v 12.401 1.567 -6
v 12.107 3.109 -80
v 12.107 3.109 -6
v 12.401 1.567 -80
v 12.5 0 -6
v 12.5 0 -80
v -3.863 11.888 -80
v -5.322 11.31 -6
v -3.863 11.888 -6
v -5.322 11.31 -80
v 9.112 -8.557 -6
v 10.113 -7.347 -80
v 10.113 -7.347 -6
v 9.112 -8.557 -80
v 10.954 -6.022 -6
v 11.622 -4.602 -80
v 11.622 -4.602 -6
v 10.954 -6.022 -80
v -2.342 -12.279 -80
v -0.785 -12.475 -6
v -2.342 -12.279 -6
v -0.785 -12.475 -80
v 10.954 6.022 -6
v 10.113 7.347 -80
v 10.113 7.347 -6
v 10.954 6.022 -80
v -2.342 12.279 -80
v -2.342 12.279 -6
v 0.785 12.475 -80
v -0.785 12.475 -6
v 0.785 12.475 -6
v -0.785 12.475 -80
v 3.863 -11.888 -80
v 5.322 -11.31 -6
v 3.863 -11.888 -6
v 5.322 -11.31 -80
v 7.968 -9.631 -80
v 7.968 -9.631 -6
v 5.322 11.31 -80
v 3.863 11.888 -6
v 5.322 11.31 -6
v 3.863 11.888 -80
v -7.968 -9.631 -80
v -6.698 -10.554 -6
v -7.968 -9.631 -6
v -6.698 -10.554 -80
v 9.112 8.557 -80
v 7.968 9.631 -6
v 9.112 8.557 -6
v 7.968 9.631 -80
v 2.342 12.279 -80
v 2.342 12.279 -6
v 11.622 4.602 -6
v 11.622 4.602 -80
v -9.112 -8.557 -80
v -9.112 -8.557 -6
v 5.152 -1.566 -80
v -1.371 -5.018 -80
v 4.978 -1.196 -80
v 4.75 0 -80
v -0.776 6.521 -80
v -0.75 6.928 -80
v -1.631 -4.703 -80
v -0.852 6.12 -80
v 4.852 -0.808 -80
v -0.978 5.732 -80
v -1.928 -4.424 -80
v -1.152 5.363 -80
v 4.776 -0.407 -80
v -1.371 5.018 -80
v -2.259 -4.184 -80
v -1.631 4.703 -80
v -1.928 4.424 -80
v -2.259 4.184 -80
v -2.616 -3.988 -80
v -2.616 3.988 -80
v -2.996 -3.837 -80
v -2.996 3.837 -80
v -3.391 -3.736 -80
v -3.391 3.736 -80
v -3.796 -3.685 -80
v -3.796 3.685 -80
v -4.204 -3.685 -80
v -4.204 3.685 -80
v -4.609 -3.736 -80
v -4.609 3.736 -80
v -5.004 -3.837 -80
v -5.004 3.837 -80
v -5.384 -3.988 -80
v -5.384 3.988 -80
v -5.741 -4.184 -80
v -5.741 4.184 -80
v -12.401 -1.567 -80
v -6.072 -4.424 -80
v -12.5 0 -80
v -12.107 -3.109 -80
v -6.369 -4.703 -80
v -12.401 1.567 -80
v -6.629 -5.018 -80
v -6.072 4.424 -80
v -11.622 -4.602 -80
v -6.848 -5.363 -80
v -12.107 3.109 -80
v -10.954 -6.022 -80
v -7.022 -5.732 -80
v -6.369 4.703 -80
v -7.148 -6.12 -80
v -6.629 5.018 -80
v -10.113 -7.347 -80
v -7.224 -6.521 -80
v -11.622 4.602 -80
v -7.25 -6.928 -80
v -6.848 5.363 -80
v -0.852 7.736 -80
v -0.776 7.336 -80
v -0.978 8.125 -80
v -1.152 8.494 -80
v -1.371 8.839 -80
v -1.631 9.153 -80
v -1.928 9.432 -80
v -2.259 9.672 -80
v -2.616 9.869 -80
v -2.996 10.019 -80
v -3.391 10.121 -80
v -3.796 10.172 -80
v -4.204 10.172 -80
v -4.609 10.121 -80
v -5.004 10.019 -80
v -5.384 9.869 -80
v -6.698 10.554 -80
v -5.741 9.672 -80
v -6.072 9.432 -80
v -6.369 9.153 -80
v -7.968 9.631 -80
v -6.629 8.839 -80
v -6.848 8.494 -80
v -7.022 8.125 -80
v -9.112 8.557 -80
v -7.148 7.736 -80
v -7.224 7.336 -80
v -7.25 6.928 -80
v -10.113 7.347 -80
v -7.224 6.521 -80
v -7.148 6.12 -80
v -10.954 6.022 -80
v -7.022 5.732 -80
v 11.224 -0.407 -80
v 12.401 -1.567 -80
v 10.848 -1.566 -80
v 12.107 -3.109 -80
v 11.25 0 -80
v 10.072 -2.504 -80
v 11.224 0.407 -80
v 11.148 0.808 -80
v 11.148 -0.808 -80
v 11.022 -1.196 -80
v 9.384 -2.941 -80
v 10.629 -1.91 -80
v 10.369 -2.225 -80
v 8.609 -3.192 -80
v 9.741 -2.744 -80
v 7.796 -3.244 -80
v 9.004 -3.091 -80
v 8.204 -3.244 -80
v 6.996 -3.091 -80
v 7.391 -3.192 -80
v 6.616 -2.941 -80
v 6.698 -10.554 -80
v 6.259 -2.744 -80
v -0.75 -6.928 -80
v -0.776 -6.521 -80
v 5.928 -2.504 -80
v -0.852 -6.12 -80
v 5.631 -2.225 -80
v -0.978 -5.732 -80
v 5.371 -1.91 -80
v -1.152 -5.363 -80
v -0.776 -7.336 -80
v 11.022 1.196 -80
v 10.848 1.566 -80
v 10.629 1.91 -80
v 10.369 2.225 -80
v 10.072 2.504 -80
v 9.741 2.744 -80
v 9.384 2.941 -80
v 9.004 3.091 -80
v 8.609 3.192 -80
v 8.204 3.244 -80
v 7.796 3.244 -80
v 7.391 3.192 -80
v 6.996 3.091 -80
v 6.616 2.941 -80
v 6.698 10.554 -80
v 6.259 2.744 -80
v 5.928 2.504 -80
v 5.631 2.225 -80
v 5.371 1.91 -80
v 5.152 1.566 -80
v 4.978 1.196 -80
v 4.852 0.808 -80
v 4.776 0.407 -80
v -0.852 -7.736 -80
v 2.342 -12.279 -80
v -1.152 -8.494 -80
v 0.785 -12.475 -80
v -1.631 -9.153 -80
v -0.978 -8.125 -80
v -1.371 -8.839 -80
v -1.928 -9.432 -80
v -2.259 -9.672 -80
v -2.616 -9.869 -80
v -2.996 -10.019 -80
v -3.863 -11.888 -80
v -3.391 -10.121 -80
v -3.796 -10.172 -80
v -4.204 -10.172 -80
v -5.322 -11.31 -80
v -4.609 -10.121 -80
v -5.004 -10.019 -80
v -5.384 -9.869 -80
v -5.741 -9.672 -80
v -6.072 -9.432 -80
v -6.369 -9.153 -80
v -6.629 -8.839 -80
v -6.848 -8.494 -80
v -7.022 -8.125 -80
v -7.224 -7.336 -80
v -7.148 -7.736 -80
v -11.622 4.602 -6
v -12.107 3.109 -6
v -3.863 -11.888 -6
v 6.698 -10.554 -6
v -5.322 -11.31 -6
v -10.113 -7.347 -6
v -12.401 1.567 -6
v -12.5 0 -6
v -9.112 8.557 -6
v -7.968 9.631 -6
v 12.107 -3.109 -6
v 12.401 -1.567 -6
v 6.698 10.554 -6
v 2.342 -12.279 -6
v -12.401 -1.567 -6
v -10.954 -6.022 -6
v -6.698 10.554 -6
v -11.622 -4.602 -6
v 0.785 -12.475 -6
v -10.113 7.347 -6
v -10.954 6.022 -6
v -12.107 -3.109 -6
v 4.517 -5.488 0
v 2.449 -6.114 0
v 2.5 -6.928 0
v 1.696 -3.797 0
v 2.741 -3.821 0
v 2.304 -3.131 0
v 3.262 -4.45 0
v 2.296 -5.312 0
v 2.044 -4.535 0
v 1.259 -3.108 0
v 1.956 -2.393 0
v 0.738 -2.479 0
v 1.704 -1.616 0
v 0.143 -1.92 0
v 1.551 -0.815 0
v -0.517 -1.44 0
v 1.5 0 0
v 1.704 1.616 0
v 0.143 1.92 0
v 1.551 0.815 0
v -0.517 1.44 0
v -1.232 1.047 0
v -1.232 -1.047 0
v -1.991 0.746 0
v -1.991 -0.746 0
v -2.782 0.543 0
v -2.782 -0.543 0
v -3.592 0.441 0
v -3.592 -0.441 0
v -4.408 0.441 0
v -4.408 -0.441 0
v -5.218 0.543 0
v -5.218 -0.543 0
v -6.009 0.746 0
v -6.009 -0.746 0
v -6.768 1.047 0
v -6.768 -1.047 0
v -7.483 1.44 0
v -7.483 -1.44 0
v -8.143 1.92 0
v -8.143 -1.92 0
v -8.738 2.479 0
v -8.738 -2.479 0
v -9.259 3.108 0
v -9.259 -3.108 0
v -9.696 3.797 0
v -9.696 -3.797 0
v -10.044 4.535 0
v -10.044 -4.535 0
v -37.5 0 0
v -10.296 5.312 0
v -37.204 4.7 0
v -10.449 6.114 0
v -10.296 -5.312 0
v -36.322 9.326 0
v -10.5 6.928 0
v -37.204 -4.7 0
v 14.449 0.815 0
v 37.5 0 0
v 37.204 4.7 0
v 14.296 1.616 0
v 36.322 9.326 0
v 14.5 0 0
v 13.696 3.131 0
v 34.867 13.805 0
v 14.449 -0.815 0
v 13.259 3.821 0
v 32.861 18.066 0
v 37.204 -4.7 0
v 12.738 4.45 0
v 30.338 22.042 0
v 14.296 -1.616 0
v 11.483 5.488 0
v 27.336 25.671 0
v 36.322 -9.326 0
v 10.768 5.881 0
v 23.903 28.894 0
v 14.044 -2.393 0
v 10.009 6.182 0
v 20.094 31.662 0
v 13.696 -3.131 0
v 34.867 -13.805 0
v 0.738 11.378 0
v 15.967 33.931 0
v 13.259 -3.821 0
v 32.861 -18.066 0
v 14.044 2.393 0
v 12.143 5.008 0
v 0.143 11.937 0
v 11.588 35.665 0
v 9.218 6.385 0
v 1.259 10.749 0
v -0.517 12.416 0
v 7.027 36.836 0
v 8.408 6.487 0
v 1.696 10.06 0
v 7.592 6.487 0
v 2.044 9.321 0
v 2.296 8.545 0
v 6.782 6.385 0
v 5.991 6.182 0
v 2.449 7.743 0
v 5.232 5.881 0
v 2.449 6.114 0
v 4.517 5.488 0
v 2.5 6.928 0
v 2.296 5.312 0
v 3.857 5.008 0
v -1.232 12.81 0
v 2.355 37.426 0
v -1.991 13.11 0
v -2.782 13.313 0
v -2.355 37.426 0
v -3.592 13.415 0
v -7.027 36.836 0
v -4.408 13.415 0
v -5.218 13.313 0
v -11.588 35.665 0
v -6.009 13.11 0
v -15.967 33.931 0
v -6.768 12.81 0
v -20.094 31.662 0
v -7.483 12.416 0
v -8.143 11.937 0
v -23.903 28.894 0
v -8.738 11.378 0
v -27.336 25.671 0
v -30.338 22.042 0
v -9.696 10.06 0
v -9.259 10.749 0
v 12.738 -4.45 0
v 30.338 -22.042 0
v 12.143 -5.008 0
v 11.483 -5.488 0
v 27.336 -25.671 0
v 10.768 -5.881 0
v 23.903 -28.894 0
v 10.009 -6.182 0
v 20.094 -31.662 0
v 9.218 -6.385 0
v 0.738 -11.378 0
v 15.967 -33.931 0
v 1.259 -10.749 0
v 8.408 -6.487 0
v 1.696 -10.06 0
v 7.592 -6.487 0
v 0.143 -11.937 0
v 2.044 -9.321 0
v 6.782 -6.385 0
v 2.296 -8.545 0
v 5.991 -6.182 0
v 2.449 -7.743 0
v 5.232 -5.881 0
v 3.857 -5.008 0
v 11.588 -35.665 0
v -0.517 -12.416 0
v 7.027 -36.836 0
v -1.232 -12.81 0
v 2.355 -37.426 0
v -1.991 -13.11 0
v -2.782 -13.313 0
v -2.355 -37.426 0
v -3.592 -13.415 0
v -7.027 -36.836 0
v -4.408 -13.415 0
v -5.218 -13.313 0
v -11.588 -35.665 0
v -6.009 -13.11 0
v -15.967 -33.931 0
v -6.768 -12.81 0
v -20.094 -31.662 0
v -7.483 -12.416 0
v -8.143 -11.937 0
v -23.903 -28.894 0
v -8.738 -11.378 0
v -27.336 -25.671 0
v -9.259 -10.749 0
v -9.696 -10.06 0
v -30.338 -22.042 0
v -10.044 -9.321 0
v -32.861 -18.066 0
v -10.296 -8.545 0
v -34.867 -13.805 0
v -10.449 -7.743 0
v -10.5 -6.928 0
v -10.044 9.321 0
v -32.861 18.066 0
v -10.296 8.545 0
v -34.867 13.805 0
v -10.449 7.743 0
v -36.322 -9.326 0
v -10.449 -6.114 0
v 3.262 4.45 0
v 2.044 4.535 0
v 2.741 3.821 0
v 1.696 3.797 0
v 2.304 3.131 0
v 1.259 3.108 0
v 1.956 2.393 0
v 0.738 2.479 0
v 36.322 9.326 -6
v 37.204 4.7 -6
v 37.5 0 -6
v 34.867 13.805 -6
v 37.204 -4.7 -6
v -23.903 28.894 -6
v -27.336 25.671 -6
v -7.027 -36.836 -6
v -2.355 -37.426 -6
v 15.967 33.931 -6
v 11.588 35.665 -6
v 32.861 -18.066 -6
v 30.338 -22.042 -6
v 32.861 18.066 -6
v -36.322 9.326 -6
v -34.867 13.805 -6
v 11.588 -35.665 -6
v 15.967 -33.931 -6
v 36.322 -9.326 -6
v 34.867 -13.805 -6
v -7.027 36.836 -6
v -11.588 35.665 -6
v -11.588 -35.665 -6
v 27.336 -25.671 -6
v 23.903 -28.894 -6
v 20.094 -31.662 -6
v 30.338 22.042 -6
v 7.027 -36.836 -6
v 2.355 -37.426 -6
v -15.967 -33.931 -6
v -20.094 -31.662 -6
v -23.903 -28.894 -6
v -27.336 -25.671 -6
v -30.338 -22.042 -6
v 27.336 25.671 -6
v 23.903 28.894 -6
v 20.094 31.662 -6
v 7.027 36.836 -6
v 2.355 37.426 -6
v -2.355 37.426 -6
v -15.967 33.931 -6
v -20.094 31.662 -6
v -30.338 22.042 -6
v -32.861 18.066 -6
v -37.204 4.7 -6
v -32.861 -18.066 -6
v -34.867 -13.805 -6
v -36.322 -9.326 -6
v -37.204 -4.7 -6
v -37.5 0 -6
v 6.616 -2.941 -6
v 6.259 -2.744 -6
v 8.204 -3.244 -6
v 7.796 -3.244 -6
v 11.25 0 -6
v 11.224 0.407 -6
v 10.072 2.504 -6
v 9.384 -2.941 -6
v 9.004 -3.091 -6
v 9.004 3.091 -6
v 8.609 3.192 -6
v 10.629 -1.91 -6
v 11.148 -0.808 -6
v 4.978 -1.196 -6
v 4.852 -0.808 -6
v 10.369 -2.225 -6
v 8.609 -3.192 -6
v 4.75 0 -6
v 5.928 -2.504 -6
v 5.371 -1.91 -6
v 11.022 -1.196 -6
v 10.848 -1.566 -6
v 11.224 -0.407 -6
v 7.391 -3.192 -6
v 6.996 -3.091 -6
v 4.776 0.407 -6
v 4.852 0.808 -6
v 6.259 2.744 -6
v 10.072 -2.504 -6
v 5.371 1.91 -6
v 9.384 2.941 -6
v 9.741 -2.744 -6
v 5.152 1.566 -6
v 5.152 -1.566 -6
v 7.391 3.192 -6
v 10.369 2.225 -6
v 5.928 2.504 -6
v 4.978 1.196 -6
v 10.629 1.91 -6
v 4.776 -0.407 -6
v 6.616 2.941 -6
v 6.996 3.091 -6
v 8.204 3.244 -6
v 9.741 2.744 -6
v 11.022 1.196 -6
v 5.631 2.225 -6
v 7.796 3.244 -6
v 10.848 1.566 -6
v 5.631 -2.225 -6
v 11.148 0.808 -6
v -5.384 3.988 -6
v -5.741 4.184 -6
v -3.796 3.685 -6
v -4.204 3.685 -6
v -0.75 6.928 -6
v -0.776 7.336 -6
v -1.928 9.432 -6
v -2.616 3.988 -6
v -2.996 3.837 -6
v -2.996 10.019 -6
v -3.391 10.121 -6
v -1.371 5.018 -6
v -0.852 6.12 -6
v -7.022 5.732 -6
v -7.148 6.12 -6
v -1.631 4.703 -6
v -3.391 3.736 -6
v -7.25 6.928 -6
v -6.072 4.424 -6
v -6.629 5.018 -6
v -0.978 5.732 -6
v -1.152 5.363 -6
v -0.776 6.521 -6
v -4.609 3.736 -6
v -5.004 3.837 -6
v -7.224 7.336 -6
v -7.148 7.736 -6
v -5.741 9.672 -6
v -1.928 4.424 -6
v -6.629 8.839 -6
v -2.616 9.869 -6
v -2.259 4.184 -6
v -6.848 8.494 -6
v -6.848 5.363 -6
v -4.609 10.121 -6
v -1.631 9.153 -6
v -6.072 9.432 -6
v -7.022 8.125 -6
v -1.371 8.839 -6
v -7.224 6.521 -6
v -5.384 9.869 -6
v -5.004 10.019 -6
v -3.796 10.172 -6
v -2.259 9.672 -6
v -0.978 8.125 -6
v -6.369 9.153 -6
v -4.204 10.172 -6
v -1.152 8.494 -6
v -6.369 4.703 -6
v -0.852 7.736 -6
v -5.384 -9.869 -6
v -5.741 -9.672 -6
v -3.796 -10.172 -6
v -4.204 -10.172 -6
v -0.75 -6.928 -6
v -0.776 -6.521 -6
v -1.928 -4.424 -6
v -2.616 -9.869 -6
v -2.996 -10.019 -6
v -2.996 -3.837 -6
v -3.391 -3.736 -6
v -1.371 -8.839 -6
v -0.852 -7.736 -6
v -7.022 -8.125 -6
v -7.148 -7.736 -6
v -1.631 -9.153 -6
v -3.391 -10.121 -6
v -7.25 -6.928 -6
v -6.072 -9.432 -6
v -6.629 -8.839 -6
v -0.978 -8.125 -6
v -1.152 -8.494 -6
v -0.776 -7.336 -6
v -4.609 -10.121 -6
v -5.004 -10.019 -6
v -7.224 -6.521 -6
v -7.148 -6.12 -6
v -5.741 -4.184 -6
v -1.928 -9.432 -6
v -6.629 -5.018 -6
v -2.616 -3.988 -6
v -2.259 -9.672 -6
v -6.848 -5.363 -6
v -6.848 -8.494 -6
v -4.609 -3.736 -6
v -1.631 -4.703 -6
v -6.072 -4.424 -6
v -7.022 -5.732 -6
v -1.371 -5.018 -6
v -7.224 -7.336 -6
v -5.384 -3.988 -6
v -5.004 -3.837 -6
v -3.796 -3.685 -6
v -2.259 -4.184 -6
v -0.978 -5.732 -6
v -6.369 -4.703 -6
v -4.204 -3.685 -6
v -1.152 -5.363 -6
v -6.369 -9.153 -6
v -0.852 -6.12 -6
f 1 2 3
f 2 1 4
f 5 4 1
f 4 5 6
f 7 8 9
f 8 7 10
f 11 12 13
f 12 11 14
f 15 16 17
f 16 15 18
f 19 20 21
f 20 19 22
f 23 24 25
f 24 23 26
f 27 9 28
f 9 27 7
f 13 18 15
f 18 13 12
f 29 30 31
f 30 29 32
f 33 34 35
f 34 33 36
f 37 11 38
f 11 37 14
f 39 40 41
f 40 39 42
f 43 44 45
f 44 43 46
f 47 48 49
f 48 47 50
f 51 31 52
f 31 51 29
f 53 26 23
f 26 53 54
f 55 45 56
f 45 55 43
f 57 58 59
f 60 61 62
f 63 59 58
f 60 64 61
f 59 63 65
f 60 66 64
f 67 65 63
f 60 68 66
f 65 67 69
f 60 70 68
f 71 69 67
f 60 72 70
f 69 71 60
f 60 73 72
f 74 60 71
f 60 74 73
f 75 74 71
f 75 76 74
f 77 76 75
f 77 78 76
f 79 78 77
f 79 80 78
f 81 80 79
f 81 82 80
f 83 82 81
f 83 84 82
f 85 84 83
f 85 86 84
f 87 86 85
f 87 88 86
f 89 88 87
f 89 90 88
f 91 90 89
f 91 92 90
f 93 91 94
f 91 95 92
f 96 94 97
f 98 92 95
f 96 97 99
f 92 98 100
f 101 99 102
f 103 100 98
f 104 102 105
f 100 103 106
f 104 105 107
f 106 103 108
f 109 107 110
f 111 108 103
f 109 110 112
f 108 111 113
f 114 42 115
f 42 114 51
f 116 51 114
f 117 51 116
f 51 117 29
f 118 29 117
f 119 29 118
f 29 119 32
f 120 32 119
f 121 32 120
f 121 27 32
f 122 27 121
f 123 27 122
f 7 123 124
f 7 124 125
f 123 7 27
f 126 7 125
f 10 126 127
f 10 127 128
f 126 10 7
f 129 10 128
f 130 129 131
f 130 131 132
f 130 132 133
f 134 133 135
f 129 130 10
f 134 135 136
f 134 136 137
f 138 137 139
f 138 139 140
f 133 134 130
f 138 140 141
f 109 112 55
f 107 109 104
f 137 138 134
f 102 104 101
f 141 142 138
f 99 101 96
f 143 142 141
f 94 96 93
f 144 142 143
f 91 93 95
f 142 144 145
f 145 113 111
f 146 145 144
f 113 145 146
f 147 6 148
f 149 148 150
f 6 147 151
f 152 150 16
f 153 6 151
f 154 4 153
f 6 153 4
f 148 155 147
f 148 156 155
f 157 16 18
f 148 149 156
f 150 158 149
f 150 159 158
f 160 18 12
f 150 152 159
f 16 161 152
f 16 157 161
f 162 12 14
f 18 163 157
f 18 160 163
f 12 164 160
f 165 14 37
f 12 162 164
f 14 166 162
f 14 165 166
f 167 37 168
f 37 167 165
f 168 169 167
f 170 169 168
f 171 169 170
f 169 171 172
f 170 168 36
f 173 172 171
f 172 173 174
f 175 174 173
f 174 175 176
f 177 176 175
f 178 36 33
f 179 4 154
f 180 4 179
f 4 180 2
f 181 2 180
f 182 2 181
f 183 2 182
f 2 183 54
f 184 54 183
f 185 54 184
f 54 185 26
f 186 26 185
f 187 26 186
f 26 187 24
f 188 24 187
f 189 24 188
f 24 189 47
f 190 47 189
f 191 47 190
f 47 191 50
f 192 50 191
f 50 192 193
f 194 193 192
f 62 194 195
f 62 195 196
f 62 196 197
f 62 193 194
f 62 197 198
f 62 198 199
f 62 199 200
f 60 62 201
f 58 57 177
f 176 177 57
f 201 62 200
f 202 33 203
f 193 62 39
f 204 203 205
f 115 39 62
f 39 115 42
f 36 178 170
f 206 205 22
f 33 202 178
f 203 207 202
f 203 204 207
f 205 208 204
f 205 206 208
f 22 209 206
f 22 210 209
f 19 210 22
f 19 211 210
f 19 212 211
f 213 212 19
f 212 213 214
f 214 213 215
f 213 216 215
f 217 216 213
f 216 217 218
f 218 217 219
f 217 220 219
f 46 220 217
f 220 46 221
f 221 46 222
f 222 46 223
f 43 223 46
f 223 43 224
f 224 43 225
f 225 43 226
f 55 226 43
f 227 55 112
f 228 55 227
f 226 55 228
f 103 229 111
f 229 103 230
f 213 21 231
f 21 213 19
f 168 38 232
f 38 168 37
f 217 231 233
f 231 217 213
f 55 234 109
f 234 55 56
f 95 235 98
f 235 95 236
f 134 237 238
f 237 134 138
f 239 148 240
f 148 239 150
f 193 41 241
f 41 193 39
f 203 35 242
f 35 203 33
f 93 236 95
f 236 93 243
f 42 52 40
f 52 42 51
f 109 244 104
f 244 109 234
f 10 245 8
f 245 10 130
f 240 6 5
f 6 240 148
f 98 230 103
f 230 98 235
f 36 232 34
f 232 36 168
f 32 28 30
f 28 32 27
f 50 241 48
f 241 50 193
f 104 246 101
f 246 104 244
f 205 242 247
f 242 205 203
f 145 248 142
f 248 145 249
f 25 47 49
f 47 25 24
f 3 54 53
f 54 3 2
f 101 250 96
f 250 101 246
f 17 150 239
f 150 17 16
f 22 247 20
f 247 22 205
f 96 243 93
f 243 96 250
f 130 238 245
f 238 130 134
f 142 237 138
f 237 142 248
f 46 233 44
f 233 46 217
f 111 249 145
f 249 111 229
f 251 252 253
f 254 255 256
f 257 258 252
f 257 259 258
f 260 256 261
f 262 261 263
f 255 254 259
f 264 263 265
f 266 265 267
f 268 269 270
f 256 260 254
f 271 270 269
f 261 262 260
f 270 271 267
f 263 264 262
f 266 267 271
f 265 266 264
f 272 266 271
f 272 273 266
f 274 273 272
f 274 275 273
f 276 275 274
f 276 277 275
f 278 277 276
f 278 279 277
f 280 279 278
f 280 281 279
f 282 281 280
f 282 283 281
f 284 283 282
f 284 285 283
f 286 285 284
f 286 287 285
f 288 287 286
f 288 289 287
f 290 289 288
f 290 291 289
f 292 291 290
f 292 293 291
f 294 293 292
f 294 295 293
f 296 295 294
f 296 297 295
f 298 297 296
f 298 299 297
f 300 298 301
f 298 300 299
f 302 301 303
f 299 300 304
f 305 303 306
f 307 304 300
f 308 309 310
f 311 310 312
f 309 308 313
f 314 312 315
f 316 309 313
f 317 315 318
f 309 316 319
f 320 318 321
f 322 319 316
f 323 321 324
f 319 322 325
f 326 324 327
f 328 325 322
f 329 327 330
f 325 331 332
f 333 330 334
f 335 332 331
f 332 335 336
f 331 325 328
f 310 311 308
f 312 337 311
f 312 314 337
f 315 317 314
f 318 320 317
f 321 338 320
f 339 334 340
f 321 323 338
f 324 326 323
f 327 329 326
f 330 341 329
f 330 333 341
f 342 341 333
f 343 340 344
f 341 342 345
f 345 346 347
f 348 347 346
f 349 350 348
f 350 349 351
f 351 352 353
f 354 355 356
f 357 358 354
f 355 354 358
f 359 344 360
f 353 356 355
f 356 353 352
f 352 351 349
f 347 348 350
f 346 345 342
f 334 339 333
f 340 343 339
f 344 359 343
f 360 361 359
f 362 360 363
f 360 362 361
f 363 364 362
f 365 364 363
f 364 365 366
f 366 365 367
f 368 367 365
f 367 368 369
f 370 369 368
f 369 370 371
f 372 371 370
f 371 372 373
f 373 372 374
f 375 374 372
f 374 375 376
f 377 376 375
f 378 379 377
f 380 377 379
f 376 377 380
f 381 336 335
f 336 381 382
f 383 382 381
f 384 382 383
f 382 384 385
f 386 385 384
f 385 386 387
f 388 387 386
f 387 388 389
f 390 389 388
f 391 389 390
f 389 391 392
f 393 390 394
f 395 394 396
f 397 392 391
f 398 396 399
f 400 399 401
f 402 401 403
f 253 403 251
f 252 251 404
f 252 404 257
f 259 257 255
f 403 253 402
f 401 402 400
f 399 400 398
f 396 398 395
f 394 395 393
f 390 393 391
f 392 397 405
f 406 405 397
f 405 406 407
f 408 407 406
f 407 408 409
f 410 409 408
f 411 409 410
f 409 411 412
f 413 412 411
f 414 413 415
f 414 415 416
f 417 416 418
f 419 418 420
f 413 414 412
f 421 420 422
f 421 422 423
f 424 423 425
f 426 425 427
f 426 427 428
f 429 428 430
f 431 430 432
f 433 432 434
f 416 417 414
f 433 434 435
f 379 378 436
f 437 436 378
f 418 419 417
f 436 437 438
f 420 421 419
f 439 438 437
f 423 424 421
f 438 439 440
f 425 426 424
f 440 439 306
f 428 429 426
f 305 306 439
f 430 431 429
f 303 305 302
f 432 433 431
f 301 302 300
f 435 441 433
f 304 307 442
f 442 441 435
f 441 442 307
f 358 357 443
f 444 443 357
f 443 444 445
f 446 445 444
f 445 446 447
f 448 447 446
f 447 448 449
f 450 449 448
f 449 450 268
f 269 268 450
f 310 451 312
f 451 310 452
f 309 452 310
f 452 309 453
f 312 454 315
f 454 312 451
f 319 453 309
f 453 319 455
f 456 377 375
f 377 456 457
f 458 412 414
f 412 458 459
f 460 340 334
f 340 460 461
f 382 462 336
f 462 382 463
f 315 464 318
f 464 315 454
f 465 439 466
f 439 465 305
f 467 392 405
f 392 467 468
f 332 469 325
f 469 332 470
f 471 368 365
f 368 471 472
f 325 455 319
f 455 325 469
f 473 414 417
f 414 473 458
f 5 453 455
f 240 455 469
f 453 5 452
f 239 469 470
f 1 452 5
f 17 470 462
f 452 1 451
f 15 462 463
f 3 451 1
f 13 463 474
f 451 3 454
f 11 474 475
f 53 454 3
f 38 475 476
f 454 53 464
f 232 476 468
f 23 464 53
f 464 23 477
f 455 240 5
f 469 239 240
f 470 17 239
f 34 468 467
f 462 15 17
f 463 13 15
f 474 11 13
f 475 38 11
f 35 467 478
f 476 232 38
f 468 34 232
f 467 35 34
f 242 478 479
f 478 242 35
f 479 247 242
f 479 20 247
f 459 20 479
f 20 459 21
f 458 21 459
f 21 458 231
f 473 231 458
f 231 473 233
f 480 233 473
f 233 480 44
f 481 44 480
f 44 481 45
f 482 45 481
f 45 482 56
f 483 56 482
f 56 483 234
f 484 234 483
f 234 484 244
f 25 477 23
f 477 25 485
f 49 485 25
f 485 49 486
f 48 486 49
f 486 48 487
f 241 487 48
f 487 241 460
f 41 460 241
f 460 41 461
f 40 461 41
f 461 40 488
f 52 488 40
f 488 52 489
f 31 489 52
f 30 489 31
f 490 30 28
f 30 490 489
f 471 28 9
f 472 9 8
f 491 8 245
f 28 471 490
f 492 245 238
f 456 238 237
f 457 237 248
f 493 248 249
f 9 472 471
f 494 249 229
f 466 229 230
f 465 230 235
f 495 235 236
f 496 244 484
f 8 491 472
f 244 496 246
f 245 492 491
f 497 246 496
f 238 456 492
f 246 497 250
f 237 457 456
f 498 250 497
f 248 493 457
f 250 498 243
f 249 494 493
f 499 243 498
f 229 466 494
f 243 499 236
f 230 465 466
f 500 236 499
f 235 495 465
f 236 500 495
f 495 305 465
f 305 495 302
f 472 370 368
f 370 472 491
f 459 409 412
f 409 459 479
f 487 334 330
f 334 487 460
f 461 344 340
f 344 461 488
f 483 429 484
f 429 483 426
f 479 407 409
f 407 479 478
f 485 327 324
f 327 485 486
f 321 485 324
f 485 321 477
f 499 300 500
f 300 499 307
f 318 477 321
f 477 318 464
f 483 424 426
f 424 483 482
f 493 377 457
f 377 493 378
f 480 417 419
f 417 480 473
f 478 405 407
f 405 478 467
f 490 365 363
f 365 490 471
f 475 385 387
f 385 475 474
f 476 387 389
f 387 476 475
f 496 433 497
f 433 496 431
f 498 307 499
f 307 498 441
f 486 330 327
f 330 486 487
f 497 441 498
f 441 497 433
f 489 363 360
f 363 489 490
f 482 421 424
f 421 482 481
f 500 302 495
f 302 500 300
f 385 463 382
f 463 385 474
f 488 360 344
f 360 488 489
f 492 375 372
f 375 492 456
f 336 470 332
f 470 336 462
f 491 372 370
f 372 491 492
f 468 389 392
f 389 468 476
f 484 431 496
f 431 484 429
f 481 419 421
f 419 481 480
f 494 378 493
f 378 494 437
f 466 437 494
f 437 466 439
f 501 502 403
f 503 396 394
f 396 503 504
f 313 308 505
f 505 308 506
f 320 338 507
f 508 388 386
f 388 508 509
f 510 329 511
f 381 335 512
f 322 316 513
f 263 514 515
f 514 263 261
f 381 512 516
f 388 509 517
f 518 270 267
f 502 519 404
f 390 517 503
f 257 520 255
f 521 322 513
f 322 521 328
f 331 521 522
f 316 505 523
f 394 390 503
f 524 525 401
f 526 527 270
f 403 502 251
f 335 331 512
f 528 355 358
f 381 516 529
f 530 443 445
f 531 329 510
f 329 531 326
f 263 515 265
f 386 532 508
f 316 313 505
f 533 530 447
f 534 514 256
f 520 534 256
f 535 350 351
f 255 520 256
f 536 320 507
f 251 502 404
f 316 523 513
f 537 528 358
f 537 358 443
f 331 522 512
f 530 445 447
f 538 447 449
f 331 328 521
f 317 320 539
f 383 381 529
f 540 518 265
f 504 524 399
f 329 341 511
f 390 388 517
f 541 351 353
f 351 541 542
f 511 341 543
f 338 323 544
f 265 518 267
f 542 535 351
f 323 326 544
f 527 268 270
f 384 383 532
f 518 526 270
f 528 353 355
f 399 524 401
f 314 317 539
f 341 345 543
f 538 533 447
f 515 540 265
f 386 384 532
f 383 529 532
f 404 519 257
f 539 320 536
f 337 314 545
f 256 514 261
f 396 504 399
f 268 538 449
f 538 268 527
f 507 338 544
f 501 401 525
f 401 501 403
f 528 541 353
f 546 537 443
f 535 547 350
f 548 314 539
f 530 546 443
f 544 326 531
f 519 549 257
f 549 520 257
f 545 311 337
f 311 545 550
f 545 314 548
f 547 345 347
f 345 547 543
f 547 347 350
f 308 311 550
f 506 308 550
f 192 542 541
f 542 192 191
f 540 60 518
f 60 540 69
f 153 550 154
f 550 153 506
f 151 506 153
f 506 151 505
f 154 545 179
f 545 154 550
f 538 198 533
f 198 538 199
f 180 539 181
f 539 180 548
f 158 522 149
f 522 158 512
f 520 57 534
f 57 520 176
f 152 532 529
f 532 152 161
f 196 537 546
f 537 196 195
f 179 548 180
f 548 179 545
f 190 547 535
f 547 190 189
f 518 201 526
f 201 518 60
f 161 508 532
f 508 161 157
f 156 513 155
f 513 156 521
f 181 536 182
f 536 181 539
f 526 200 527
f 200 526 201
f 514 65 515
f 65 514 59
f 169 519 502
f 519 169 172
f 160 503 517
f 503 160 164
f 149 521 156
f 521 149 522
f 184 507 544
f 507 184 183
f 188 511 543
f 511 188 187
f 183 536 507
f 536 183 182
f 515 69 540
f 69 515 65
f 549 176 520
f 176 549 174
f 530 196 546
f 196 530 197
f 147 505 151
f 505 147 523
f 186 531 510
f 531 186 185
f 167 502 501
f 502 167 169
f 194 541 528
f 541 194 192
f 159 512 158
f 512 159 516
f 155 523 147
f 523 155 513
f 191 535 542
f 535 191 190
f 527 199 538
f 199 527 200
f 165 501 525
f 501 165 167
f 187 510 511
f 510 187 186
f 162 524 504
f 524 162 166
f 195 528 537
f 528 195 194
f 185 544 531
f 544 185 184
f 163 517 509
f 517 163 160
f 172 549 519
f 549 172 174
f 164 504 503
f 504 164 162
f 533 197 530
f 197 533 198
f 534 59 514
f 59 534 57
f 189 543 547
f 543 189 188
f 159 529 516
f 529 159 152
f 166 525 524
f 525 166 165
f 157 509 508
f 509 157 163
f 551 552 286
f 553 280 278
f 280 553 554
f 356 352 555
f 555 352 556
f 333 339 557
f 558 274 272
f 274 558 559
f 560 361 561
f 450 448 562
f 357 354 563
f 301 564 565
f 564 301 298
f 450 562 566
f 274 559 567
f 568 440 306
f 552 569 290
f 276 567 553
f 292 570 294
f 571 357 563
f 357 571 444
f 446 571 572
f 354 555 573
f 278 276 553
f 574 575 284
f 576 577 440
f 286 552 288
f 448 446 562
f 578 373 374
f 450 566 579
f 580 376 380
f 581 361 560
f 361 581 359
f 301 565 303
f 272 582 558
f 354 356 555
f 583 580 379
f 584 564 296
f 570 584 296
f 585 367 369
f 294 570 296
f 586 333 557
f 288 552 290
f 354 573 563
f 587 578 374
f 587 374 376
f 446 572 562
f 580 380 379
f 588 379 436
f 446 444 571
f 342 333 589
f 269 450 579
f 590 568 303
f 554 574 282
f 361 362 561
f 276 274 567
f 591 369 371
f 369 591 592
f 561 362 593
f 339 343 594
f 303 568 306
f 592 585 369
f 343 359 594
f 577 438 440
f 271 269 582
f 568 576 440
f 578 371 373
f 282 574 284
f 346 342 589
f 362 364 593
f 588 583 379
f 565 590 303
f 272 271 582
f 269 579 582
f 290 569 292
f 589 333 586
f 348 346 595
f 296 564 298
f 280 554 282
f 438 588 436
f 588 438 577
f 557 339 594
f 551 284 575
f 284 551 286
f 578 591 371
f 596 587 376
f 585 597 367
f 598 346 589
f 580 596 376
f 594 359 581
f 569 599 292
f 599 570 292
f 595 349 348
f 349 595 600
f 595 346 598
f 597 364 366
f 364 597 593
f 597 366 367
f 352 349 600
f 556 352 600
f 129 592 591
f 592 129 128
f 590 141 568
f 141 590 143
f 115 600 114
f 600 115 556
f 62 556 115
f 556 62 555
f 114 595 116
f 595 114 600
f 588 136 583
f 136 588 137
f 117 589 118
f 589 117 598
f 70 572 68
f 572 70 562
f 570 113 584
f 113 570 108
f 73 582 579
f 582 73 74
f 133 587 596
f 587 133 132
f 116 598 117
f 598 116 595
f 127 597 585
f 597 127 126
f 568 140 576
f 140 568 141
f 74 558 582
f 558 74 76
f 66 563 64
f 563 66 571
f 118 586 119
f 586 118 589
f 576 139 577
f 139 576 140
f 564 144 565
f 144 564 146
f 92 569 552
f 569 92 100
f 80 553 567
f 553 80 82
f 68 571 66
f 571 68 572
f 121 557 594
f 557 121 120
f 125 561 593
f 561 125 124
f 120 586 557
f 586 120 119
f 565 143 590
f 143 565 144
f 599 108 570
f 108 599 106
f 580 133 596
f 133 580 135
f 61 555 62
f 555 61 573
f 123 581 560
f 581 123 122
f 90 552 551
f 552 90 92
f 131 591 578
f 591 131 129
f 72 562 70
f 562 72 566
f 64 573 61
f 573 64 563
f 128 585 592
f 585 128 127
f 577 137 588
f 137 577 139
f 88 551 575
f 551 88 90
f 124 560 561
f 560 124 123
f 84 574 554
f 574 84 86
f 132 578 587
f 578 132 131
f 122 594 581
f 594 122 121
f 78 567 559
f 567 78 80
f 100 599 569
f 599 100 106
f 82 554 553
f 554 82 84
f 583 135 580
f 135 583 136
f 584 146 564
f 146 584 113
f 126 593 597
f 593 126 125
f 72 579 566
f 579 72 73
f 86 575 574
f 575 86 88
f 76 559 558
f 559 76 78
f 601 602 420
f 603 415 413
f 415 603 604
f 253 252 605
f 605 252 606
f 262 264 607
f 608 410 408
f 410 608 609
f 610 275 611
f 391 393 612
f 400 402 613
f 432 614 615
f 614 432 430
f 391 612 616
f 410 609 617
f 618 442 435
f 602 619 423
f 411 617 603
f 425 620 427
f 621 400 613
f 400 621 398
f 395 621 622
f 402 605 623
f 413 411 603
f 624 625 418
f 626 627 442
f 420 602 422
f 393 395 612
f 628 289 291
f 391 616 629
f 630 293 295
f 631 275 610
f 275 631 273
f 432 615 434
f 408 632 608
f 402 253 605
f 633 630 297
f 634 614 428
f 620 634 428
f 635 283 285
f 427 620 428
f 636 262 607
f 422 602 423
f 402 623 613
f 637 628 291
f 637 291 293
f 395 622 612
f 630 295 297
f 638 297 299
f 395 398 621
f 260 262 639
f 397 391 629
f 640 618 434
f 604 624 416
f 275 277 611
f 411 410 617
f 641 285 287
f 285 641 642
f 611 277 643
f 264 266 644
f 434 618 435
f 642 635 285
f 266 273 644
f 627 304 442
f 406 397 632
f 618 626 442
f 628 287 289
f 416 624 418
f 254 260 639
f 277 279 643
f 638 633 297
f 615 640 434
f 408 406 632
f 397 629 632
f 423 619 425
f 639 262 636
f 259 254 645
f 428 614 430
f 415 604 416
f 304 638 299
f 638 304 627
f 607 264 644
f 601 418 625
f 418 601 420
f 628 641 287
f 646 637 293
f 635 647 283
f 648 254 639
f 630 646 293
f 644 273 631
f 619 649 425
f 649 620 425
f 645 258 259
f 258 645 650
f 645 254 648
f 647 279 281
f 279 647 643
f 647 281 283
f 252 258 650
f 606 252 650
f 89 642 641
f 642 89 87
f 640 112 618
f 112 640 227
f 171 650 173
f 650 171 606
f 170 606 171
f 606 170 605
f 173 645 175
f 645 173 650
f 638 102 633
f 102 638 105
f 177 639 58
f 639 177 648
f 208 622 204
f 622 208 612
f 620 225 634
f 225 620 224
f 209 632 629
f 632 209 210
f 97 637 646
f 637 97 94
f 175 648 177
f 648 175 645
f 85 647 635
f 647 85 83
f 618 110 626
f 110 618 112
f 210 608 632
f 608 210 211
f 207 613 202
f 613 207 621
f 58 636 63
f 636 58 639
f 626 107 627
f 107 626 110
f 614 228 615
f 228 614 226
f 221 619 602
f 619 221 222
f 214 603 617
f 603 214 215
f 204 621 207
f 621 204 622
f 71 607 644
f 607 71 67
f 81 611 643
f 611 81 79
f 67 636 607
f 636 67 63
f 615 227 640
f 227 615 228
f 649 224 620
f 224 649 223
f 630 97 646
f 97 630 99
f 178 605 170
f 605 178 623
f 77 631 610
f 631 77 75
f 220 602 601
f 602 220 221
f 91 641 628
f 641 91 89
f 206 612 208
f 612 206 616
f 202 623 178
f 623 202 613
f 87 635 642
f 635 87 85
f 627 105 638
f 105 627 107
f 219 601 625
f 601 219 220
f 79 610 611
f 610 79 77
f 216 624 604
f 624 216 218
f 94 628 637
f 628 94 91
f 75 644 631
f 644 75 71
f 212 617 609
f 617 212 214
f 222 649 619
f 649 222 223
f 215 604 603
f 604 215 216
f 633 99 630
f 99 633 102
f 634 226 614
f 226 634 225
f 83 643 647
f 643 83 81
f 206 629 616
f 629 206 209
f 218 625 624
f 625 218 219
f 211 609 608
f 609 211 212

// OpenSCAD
$fn = 50;


difference() {
	union() {
		translate(v = [0, 0, -80.0000000000]) {
			cylinder(h = 80, r = 12.5000000000);
		}
		translate(v = [0, 0, -6.0000000000]) {
			cylinder(h = 6, r = 37.5000000000);
		}
	}
	union() {
		translate(v = [8.0000000000, 0.0000000000, 0]) {
			rotate(a = [0, 0, 0]) {
				difference() {
					union() {
						#translate(v = [0, 0, -80.0000000000]) {
							cylinder(h = 80, r = 2.2500000000);
						}
						#translate(v = [0, 0, -6]) {
							cylinder(h = 6, r = 12.5000000000, r1 = 3.2500000000, r2 = 6.5000000000);
						}
						#translate(v = [0, 0, -80.0000000000]) {
							cylinder(h = 80, r = 3.2500000000);
						}
						#translate(v = [0, 0, -80.0000000000]) {
							cylinder(h = 80, r = 2.2500000000);
						}
					}
					union();
				}
			}
		}
		translate(v = [-4.0000000000, 6.9282032303, 0]) {
			rotate(a = [0, 0, 0]) {
				difference() {
					union() {
						#translate(v = [0, 0, -80.0000000000]) {
							cylinder(h = 80, r = 2.2500000000);
						}
						#translate(v = [0, 0, -6]) {
							cylinder(h = 6, r = 12.5000000000, r1 = 3.2500000000, r2 = 6.5000000000);
						}
						#translate(v = [0, 0, -80.0000000000]) {
							cylinder(h = 80, r = 3.2500000000);
						}
						#translate(v = [0, 0, -80.0000000000]) {
							cylinder(h = 80, r = 2.2500000000);
						}
					}
					union();
				}
			}
		}
		translate(v = [-4.0000000000, -6.9282032303, 0]) {
			rotate(a = [0, 0, 0]) {
				difference() {
					union() {
						#translate(v = [0, 0, -80.0000000000]) {
							cylinder(h = 80, r = 2.2500000000);
						}
						#translate(v = [0, 0, -6]) {
							cylinder(h = 6, r = 12.5000000000, r1 = 3.2500000000, r2 = 6.5000000000);
						}
						#translate(v = [0, 0, -80.0000000000]) {
							cylinder(h = 80, r = 3.2500000000);
						}
						#translate(v = [0, 0, -80.0000000000]) {
							cylinder(h = 80, r = 2.2500000000);
						}
					}
					union();
				}
			}
		}
	}
}
